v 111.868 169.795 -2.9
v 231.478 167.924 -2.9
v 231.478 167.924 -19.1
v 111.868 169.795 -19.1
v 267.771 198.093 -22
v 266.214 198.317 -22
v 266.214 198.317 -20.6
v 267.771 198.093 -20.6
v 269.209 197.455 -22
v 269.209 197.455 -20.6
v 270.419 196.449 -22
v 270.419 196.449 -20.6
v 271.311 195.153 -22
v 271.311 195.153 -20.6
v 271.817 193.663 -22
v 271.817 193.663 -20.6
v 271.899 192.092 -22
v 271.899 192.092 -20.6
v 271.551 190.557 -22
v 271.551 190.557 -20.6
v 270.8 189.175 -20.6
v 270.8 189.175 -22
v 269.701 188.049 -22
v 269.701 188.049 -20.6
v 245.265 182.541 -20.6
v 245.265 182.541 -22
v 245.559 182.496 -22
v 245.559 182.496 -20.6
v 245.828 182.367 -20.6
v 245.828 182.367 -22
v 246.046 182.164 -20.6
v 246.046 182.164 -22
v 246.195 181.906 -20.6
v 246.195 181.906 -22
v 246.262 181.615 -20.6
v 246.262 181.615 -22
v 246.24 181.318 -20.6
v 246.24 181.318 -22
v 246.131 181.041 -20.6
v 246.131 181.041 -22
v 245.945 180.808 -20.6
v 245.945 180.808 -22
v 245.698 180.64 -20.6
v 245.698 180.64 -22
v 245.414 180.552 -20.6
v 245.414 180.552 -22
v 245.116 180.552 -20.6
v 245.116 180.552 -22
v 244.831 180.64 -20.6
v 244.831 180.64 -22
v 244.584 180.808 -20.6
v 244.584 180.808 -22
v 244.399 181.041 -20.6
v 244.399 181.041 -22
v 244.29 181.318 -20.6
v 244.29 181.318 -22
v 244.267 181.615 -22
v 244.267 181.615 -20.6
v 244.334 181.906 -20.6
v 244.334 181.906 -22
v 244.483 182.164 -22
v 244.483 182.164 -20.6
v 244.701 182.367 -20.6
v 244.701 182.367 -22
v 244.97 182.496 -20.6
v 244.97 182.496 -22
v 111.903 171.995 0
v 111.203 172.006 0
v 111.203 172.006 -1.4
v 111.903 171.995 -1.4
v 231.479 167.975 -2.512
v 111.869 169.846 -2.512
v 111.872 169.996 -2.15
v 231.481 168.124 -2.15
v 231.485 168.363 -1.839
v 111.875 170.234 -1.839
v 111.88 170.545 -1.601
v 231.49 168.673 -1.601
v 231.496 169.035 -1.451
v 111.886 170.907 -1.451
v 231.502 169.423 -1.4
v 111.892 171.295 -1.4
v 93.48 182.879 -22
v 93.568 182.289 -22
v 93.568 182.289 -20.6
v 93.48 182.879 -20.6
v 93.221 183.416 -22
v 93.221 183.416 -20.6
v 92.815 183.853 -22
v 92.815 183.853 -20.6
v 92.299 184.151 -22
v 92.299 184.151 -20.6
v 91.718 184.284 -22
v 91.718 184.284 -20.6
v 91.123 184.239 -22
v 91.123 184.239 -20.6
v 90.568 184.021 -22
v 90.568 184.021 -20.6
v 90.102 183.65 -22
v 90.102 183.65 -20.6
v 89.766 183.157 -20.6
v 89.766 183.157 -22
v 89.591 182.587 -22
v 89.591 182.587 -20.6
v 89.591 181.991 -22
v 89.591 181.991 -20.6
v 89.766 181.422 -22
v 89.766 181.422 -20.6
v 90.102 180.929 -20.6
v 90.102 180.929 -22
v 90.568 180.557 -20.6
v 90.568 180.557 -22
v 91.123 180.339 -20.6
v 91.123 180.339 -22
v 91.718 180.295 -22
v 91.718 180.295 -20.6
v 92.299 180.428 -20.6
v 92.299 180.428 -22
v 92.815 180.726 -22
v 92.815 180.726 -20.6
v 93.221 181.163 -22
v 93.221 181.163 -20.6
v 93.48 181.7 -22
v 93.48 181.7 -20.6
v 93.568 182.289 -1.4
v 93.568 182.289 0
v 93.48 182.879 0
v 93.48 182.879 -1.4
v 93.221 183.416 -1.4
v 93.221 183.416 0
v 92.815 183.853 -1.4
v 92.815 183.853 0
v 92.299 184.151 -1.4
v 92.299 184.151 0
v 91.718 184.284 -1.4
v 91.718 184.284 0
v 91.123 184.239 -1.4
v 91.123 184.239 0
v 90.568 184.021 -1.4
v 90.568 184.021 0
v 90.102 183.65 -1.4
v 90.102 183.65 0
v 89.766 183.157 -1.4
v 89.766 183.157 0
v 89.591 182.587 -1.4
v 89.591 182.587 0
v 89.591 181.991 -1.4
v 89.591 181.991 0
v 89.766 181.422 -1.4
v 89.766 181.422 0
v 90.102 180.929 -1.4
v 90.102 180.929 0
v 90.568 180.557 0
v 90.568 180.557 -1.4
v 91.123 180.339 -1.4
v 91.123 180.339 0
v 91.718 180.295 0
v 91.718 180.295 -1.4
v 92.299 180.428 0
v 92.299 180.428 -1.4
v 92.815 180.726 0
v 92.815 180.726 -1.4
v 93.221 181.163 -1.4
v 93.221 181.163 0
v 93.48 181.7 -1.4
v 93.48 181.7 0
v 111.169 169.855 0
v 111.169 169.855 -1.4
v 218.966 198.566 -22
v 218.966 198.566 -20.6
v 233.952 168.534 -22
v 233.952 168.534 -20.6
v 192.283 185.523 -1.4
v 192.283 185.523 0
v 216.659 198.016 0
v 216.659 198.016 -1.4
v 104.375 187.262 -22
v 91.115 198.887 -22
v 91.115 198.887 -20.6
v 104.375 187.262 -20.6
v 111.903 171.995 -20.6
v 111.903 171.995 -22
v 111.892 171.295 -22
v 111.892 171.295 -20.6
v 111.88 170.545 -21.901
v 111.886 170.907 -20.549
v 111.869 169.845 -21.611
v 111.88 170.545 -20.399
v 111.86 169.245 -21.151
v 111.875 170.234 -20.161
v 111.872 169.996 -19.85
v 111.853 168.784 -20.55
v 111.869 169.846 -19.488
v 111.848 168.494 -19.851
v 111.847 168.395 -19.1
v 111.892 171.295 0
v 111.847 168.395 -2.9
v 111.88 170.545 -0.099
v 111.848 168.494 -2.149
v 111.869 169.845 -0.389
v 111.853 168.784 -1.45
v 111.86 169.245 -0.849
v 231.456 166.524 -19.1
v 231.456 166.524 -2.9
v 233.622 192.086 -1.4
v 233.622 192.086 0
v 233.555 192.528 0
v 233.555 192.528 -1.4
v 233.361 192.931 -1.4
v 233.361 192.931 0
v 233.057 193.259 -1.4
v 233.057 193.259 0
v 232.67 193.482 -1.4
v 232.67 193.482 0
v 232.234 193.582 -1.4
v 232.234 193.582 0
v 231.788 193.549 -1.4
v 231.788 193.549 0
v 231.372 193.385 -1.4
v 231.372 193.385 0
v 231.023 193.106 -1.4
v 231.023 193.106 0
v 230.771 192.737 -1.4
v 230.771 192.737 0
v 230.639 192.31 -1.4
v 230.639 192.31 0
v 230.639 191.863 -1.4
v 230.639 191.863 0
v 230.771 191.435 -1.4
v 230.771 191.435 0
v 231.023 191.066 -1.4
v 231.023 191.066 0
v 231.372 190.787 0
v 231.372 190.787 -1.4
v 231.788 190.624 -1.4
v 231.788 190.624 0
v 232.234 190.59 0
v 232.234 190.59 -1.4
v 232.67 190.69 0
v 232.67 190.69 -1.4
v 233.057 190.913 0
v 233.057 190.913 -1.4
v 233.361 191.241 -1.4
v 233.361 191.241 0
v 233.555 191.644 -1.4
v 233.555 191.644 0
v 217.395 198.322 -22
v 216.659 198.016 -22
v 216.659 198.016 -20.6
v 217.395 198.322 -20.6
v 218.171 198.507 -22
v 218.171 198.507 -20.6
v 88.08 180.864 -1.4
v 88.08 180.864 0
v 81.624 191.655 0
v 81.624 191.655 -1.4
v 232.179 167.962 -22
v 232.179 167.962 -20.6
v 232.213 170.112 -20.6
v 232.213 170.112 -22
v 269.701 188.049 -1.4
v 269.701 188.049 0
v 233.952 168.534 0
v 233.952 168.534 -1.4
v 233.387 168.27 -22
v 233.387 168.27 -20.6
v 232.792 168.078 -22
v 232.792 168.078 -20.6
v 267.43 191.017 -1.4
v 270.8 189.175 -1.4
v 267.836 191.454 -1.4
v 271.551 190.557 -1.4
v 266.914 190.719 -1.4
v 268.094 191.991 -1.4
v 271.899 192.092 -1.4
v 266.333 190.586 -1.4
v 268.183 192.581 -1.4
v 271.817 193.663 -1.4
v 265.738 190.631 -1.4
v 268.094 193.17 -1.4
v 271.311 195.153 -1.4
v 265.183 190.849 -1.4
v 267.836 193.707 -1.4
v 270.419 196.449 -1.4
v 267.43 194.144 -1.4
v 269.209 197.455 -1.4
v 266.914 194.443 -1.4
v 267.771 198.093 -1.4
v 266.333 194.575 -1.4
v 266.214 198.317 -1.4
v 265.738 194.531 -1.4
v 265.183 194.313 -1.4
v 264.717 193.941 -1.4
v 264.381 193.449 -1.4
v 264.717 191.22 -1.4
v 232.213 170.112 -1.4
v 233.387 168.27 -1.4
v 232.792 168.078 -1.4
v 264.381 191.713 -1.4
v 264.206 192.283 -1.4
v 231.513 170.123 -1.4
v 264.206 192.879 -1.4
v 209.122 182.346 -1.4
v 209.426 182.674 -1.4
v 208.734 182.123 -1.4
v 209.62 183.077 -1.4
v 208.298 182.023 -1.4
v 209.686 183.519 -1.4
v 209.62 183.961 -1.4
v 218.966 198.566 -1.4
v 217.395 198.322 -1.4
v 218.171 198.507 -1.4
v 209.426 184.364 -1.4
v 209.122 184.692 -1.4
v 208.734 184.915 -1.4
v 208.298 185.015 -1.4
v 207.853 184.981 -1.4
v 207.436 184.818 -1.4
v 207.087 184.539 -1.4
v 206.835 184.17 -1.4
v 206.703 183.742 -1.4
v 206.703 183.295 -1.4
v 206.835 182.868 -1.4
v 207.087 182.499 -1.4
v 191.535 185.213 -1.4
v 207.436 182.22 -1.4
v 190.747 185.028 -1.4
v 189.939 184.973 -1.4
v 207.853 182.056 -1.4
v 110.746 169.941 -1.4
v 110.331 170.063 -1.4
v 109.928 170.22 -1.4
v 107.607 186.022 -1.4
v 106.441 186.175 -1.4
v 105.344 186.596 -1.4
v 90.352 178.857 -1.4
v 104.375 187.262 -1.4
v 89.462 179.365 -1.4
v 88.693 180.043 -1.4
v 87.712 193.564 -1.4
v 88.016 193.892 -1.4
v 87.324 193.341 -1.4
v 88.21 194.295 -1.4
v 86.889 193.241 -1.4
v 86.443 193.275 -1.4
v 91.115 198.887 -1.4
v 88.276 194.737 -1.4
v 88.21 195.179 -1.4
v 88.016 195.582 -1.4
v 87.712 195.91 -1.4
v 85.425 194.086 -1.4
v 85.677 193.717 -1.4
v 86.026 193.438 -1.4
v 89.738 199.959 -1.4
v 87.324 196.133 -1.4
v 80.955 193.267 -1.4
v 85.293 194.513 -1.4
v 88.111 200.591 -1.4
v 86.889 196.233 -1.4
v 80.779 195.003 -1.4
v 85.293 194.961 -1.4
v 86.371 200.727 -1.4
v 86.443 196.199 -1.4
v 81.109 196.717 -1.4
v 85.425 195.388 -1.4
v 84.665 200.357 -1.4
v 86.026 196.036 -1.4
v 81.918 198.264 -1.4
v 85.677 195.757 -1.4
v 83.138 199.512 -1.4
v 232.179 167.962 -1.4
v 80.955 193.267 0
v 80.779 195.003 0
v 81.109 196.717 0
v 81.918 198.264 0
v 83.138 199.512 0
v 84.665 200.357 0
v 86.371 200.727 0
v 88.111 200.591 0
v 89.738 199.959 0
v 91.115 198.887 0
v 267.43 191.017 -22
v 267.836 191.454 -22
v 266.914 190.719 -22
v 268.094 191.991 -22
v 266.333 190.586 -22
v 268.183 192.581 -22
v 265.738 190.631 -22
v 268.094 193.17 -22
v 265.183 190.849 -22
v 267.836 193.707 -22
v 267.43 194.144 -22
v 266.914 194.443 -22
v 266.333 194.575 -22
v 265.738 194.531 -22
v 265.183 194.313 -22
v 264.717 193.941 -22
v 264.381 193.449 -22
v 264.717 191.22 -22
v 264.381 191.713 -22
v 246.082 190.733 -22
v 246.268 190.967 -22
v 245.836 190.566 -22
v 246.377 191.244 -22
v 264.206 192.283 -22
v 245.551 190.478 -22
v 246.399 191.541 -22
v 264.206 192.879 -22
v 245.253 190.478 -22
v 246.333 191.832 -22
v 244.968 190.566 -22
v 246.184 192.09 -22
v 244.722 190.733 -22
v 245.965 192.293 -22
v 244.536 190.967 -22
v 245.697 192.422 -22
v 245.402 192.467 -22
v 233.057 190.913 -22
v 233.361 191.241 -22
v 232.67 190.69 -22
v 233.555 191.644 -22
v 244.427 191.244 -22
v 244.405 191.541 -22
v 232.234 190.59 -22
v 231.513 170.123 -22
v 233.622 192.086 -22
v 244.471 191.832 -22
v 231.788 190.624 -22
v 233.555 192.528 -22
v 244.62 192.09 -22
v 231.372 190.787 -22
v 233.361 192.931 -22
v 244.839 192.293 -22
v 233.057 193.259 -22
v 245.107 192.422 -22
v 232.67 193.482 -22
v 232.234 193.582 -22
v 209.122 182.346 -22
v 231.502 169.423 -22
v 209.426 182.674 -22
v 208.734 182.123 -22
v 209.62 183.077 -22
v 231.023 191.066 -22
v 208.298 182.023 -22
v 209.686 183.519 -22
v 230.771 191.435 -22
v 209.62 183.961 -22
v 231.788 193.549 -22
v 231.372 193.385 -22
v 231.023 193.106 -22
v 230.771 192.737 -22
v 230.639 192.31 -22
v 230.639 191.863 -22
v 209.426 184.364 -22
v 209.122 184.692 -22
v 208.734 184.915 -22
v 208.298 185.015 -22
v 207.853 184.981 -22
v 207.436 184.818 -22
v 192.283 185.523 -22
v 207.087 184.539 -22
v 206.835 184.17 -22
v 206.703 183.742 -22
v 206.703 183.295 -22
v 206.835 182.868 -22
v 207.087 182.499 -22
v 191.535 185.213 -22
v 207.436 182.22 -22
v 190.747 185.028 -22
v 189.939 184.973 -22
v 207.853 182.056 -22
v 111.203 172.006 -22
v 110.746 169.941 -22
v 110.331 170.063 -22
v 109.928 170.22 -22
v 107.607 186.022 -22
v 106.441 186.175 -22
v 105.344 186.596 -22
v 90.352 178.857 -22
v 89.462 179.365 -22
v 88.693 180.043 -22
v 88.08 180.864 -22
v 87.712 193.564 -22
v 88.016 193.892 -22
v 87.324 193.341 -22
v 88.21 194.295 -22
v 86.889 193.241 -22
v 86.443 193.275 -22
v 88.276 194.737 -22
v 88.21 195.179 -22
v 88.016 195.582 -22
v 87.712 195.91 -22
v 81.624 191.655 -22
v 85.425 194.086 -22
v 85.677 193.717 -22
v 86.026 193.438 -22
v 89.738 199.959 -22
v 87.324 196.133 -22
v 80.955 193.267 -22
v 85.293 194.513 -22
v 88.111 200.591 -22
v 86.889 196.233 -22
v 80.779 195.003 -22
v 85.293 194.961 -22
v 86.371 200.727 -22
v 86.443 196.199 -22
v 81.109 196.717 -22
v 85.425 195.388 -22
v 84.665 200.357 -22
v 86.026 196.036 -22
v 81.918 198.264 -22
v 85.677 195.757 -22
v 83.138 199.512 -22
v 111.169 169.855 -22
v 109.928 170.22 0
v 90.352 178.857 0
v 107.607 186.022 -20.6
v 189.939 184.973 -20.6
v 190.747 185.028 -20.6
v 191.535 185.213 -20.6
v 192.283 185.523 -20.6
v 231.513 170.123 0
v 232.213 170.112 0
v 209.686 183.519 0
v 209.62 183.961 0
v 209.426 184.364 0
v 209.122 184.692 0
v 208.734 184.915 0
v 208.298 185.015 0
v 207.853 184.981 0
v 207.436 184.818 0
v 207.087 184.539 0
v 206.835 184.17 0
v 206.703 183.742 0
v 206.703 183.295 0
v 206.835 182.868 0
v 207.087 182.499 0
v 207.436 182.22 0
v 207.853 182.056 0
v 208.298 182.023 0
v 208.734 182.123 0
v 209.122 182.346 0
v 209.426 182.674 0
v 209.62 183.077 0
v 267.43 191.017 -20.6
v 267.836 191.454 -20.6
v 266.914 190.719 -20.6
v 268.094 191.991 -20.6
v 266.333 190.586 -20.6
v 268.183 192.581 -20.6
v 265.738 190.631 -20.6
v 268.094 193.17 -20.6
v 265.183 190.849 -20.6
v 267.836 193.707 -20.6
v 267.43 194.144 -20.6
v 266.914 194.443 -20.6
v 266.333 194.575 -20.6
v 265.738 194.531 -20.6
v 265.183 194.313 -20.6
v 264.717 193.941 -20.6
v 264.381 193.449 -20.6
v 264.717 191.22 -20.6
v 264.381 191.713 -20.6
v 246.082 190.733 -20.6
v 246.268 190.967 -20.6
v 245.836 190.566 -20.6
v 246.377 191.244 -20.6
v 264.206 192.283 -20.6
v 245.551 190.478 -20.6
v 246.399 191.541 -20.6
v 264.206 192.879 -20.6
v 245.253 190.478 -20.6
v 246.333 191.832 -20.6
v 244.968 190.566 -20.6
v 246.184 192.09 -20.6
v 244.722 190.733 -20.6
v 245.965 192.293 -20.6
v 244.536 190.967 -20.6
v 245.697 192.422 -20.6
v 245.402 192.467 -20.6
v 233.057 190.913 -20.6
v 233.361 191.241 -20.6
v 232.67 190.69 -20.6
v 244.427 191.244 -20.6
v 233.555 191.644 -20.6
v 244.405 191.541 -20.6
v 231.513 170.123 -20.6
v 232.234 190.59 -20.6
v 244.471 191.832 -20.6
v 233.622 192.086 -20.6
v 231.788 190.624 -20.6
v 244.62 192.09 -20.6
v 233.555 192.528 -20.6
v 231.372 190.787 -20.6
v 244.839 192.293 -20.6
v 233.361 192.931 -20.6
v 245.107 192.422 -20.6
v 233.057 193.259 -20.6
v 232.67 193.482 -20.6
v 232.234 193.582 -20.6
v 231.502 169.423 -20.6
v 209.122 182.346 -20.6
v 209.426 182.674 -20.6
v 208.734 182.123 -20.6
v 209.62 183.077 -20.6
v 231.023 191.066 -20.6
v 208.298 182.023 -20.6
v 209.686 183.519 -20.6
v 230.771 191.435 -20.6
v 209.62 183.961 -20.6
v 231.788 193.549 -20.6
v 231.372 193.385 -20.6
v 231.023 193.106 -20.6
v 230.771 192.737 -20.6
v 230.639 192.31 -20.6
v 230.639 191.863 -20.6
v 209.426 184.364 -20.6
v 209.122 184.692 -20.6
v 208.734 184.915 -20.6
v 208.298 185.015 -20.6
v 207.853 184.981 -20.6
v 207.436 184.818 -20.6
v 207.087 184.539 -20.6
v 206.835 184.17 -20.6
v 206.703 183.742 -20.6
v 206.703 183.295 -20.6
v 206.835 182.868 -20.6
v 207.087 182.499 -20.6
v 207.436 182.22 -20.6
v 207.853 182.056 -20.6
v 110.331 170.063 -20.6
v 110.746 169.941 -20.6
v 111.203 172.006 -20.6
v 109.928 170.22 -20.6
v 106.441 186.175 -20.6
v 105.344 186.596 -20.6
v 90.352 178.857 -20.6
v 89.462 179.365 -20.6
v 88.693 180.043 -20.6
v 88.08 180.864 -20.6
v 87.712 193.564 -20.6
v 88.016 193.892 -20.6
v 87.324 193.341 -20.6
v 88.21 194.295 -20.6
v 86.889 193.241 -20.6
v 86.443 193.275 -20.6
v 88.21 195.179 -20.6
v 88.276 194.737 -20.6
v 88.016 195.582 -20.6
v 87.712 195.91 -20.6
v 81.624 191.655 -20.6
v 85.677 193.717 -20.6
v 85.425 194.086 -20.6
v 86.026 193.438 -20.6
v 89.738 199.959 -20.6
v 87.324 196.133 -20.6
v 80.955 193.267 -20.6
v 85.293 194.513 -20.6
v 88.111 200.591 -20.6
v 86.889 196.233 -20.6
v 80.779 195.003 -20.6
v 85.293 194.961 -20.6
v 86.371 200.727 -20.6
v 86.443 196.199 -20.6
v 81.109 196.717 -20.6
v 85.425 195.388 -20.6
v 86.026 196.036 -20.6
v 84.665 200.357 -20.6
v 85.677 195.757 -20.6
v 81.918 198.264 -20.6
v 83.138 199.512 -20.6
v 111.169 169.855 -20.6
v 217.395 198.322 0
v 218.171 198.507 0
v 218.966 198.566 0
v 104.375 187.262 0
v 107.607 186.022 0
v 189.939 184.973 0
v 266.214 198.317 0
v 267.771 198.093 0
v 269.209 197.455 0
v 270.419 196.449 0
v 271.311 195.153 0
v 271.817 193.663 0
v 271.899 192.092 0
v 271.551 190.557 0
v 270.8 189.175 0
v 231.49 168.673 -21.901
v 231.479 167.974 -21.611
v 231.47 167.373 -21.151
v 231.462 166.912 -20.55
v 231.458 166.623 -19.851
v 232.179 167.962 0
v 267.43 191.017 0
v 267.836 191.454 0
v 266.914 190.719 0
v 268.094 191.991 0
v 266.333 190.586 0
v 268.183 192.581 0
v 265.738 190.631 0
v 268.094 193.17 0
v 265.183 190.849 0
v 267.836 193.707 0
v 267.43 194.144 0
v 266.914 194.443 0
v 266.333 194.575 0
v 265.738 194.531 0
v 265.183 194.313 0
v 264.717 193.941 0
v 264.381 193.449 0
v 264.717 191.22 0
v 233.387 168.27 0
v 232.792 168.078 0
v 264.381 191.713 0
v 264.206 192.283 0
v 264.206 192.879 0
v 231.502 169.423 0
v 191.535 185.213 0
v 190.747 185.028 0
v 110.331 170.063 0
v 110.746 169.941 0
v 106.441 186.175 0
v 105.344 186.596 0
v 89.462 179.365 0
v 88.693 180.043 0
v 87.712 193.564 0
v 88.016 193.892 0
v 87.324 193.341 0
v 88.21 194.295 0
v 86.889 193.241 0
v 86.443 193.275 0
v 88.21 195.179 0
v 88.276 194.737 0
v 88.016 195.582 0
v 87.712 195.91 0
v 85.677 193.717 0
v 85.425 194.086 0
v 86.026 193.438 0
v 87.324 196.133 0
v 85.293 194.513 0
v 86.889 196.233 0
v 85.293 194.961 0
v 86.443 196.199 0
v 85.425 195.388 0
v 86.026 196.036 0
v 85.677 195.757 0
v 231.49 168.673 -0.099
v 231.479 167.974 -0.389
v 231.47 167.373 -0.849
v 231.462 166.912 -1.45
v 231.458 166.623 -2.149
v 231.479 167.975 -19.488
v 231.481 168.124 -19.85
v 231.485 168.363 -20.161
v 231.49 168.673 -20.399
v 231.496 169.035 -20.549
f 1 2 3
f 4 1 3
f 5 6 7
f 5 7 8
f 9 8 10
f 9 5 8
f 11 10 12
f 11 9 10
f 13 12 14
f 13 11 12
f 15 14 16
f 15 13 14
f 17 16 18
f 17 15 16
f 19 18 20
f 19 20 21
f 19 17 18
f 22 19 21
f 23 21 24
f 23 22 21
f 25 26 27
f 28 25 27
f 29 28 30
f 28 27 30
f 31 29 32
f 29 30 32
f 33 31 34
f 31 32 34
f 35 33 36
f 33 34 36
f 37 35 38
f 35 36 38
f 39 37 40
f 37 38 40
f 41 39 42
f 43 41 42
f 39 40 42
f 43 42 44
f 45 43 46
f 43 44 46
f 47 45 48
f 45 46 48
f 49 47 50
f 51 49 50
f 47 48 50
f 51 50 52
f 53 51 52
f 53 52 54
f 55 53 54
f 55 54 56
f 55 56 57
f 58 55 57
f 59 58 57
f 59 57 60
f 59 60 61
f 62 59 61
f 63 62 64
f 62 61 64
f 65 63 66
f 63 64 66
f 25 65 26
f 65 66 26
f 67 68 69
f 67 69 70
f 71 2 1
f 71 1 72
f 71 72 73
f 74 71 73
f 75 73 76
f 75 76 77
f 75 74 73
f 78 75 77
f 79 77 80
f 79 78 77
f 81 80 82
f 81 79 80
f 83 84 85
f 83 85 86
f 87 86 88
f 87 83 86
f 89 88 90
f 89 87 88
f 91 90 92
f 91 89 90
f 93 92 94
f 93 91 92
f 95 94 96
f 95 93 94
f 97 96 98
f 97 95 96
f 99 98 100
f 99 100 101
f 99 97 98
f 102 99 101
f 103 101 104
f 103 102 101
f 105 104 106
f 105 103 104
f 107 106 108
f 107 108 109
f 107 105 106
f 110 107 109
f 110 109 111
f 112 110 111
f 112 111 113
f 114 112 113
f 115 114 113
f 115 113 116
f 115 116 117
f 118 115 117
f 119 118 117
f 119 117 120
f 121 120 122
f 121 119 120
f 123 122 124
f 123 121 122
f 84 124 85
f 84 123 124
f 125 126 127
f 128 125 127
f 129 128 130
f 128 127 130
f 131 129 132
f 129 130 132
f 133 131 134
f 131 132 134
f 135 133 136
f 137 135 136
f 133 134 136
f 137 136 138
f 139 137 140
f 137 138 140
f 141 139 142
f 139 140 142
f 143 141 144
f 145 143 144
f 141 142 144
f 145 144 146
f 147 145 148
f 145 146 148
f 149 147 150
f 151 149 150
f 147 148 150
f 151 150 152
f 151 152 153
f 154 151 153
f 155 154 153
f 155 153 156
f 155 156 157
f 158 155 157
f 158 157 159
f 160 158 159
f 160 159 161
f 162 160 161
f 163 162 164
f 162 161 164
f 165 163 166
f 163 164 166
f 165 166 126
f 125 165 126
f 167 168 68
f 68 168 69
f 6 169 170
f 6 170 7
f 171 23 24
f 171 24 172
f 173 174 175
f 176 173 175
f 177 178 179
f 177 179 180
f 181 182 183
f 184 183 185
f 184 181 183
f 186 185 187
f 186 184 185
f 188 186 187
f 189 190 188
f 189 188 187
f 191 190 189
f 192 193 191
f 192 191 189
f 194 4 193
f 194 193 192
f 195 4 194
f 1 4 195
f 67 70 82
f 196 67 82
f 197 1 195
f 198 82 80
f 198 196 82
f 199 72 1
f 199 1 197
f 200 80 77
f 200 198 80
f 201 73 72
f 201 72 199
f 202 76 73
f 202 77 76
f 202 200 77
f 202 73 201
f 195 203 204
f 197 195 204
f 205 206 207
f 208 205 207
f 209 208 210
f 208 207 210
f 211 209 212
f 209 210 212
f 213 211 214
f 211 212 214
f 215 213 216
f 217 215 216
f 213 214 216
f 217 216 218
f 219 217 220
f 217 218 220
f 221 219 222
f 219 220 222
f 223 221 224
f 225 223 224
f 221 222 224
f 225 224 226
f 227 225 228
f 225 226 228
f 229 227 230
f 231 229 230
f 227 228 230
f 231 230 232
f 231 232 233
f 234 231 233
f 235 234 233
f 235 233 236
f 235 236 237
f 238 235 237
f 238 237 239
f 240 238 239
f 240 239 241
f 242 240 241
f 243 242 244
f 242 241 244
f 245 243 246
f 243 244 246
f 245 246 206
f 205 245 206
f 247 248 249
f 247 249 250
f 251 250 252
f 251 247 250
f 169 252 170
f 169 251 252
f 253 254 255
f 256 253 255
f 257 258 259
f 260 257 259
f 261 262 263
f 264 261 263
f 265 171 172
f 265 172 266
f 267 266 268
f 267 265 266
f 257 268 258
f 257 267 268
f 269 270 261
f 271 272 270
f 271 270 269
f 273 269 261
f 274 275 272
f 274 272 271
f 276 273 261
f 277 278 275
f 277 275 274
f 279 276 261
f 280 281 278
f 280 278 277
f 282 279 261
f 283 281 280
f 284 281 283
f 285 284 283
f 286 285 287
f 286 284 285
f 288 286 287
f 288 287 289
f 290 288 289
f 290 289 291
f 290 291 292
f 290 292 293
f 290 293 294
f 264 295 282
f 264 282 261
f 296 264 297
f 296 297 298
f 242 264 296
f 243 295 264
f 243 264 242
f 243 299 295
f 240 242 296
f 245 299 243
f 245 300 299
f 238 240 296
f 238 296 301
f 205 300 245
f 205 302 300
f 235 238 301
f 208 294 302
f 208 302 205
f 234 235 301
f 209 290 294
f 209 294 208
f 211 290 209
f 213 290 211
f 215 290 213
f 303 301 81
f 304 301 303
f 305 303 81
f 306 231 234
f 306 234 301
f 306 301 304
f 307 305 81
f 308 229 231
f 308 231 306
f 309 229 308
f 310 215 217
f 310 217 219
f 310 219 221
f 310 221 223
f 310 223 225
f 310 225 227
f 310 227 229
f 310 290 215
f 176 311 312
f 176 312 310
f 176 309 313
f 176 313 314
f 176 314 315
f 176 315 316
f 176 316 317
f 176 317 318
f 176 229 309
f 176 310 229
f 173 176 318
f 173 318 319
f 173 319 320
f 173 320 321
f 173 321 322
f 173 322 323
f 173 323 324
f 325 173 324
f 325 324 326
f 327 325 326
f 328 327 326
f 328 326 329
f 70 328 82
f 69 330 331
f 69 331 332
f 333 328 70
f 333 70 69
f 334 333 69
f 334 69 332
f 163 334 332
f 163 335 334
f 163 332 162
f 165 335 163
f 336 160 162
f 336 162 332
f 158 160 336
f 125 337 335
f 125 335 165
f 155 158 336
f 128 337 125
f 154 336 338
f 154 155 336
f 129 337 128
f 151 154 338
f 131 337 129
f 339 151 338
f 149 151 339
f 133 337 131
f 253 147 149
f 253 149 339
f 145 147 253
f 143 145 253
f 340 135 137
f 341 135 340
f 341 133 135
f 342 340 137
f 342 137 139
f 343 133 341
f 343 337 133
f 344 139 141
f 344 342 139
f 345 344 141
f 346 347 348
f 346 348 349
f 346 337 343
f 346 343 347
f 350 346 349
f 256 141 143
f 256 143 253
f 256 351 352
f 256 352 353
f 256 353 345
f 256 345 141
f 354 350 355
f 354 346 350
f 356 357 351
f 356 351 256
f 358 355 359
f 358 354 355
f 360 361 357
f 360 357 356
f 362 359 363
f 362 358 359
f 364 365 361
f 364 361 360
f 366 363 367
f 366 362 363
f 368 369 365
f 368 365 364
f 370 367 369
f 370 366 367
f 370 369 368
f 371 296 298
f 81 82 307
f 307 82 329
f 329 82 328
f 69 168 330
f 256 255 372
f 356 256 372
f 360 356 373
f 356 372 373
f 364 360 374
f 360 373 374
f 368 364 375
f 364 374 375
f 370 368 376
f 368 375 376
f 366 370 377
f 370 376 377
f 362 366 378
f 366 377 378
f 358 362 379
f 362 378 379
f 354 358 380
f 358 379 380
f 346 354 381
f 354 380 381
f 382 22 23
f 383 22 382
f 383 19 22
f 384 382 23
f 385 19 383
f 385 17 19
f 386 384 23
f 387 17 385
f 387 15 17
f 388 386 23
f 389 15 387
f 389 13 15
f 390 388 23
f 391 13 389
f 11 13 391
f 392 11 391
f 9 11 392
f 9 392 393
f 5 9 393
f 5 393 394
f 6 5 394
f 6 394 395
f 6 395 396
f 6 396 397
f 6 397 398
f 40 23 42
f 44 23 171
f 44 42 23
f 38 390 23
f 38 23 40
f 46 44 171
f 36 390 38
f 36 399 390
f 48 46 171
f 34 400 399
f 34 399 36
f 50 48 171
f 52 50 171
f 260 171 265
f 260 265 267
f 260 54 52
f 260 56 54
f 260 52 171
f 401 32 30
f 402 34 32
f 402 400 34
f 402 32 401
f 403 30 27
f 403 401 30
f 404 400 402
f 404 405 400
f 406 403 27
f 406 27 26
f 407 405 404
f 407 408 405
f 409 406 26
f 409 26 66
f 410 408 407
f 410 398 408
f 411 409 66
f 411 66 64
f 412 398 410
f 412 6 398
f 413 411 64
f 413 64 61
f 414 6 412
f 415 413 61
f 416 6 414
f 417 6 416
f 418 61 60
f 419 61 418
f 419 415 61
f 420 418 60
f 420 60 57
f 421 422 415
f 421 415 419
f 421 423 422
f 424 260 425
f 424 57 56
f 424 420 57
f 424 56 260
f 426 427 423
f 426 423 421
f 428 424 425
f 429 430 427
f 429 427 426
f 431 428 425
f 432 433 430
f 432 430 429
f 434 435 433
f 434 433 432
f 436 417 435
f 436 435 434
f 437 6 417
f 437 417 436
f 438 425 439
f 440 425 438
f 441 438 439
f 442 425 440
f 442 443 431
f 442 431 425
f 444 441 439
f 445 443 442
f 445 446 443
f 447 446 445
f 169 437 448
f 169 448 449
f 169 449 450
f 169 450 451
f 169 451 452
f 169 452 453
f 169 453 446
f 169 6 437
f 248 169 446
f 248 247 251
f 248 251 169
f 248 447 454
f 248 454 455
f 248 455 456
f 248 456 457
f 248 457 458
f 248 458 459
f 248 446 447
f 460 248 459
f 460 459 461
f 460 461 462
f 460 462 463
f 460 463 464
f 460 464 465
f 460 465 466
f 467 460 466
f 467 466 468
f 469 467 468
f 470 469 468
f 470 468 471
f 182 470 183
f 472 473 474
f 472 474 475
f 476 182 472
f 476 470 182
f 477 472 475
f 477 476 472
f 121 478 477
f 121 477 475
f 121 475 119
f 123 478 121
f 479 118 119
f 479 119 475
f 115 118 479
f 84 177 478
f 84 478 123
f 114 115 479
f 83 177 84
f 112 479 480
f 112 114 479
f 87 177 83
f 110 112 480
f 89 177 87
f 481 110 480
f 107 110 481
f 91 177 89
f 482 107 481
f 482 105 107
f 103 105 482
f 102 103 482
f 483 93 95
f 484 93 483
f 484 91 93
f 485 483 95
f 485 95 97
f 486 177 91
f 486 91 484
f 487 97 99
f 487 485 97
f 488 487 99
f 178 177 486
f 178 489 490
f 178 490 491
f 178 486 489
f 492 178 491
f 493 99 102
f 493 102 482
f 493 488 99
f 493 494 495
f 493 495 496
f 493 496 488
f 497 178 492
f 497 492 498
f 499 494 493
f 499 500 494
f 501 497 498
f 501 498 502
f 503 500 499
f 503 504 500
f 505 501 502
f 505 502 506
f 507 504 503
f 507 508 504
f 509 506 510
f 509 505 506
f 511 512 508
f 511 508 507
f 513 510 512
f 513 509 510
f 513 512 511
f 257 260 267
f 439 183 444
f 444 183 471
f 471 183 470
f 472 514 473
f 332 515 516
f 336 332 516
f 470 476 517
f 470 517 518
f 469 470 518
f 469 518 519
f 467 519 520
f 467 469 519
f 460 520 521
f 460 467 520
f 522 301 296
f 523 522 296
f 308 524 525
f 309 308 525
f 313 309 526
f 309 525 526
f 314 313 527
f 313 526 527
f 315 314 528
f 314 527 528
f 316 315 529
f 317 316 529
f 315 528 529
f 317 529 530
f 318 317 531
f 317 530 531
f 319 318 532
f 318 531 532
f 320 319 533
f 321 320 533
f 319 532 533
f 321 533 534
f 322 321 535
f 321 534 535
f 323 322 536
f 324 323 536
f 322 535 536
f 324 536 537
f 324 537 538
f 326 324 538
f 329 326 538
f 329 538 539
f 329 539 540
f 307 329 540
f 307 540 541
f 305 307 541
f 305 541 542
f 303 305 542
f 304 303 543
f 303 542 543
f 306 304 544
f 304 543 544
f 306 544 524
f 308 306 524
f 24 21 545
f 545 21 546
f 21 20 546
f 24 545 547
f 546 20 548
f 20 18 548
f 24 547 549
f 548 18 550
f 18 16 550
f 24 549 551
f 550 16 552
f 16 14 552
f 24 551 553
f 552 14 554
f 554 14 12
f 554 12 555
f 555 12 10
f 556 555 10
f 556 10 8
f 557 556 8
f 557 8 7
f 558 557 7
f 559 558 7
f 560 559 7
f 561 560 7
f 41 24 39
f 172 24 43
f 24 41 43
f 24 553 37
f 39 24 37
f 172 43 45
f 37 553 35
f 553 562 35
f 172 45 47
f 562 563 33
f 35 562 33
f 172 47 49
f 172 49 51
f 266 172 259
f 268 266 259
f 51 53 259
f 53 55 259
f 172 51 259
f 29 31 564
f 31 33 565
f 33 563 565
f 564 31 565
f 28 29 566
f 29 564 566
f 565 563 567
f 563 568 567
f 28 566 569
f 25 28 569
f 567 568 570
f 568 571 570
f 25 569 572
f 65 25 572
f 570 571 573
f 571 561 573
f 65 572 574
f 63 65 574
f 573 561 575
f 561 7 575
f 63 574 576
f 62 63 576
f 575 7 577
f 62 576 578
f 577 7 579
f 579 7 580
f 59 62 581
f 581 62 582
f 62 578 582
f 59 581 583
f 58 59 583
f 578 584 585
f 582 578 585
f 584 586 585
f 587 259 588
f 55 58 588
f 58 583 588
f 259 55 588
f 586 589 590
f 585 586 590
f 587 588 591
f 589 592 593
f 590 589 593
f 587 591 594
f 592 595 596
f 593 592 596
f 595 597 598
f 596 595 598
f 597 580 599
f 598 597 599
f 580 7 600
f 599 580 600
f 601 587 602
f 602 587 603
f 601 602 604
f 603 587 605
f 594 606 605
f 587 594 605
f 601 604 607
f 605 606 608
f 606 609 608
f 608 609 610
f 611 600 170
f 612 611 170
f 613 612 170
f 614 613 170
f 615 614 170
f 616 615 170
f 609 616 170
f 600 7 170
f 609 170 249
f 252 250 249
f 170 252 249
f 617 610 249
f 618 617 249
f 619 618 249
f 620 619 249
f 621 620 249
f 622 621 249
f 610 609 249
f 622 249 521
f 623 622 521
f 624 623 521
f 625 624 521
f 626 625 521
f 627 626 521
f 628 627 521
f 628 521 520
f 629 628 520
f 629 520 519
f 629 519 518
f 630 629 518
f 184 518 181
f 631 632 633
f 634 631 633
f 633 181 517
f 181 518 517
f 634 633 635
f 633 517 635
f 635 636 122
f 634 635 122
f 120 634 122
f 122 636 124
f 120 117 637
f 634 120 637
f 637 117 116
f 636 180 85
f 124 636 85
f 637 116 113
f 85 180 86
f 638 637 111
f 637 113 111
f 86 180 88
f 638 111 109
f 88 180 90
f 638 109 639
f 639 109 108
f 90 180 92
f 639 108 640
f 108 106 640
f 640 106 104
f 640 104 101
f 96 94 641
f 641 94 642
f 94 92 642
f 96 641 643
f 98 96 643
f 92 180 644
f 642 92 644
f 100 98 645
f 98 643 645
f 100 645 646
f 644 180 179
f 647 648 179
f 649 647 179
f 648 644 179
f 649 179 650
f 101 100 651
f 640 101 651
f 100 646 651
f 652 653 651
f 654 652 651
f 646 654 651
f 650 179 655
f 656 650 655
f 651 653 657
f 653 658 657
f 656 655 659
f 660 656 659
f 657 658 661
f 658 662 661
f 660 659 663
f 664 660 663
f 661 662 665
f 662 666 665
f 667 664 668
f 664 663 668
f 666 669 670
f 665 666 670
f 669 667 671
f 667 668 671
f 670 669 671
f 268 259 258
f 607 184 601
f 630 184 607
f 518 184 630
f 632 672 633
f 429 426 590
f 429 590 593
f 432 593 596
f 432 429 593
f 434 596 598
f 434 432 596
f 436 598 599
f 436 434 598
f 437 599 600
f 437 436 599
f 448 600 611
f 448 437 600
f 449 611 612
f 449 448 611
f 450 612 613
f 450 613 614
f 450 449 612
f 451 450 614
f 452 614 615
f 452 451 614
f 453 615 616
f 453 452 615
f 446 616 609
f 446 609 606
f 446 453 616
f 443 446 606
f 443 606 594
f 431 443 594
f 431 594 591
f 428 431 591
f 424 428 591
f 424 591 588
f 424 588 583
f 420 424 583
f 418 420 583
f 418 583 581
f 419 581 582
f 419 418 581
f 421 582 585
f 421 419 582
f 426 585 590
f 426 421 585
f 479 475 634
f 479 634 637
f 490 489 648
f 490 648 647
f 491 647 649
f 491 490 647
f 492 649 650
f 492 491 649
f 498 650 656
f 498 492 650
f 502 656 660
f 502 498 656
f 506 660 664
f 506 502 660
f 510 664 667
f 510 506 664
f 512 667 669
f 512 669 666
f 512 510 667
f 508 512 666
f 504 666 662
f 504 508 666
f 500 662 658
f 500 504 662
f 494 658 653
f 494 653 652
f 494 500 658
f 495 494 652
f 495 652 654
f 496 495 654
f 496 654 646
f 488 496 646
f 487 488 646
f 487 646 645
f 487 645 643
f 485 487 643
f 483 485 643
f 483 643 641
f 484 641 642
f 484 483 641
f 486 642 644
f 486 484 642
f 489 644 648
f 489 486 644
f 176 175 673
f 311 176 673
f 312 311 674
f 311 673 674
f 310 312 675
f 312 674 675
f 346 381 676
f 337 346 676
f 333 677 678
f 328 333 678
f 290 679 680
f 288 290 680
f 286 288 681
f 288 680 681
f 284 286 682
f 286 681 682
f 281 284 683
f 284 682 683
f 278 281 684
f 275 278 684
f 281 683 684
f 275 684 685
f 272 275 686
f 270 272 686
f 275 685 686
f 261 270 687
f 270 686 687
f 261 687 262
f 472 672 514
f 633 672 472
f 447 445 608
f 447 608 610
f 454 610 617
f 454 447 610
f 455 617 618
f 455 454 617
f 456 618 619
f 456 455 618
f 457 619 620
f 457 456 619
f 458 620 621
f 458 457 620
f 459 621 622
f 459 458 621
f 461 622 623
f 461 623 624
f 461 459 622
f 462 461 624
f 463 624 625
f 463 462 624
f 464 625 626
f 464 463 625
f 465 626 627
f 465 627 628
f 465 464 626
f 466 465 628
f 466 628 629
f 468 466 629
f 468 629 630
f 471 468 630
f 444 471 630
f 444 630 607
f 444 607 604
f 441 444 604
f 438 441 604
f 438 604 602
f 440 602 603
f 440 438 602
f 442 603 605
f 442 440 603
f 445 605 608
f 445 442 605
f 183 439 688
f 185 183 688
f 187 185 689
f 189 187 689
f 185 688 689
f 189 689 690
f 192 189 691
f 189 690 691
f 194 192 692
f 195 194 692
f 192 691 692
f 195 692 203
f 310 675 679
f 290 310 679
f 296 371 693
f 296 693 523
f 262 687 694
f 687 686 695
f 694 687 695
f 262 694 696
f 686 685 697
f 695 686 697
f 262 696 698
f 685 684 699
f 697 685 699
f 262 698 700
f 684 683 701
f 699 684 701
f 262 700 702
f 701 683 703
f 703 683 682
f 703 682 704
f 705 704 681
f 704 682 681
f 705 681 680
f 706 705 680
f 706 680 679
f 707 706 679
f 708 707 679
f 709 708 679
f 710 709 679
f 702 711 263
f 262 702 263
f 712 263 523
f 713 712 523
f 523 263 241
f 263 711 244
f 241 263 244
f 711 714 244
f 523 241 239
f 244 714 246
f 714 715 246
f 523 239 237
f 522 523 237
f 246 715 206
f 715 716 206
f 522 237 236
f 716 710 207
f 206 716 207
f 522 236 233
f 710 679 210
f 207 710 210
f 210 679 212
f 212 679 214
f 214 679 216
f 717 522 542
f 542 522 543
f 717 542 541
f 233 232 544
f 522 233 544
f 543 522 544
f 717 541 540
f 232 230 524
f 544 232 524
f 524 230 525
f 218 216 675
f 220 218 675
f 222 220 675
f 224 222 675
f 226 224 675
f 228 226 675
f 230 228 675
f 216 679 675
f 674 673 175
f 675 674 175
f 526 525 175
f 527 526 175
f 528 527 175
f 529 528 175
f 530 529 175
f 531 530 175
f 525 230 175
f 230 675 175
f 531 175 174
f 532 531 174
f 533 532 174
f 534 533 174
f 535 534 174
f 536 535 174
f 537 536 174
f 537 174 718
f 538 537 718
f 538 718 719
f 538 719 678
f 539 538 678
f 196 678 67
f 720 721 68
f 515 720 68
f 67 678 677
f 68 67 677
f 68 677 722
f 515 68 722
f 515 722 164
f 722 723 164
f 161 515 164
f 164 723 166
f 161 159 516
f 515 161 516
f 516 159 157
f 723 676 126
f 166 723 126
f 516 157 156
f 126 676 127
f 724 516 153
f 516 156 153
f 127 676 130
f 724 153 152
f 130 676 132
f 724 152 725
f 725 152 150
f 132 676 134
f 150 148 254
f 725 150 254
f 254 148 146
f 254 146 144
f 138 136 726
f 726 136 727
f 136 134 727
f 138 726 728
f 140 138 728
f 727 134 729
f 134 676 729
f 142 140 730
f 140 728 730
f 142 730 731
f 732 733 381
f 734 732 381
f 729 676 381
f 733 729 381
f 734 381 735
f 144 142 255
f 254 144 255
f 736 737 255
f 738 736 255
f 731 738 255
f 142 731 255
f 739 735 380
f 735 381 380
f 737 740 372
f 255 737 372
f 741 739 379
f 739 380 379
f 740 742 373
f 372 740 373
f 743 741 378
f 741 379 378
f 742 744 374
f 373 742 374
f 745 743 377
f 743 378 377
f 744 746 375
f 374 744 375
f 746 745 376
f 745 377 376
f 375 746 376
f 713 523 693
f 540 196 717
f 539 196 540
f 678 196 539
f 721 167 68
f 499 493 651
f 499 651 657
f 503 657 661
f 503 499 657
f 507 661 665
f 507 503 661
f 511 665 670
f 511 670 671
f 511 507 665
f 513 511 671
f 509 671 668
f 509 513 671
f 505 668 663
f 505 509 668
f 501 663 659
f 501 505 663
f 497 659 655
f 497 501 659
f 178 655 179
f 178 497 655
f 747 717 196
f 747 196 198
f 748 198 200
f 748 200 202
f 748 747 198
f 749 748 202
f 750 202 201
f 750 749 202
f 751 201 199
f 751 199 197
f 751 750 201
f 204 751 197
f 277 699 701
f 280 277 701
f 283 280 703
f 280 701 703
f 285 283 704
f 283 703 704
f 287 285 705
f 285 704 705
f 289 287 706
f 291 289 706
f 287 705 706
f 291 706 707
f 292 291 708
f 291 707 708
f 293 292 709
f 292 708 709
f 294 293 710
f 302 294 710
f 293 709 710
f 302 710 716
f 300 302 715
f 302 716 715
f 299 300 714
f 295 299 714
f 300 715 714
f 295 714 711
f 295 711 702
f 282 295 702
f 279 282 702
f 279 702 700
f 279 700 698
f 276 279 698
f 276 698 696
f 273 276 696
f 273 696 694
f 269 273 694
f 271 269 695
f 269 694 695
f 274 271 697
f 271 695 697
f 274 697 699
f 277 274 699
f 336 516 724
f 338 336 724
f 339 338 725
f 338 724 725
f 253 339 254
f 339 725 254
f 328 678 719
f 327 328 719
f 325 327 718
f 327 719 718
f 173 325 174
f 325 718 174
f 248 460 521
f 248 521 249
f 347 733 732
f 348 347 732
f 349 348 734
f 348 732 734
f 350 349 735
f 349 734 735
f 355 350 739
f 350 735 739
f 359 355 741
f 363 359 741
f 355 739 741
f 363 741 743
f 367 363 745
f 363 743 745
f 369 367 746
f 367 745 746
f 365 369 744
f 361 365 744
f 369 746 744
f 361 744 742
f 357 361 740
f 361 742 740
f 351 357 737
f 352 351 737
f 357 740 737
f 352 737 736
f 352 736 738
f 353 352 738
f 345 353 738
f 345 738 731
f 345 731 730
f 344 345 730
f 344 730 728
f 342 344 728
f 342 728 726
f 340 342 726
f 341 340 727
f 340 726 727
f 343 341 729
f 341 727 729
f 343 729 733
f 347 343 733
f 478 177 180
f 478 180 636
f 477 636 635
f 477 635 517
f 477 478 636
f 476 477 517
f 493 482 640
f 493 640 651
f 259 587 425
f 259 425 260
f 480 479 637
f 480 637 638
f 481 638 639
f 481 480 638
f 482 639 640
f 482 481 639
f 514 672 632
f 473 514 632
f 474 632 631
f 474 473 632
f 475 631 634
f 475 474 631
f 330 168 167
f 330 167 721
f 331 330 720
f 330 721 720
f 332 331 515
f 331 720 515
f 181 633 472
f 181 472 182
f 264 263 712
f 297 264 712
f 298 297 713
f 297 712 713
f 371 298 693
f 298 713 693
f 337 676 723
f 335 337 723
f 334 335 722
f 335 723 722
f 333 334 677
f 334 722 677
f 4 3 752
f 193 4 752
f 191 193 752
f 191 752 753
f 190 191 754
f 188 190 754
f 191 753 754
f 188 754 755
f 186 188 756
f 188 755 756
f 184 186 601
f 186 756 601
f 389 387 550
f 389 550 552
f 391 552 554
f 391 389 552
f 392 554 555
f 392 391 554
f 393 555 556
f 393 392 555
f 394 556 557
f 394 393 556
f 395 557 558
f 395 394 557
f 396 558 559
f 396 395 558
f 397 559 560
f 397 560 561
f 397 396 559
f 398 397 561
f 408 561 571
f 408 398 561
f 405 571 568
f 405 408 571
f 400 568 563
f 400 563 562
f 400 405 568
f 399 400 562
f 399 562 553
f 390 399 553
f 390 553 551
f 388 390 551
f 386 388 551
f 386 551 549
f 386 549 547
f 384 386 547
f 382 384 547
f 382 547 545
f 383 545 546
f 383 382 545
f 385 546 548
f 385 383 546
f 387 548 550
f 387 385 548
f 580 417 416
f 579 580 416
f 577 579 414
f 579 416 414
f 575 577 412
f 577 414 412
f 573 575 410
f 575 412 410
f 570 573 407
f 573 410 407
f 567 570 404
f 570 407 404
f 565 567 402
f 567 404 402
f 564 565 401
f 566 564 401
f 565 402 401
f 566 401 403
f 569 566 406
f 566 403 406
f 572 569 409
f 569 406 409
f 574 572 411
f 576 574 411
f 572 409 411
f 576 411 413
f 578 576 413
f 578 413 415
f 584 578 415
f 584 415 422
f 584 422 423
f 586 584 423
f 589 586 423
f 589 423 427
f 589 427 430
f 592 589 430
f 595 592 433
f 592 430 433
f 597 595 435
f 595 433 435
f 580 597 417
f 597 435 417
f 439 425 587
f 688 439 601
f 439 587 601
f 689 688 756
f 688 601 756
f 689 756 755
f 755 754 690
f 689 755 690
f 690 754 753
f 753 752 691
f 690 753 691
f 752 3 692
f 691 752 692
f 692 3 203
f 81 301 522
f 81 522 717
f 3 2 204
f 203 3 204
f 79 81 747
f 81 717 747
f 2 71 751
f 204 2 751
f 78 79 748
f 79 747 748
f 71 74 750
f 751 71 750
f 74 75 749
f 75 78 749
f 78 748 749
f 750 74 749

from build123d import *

# Parameters (mm, degrees)
SKETCH2_R                     = 1.5
SKETCH2_R_2                   = 2
BASE_FLANGE1_DEPTH            = 1.4
EDGE_FLANGE1_STRIP_W          = 8.6
EDGE_FLANGE1_STRIP_H          = 1.4
EDGE_FLANGE1_STRIP_CUT_DEPTH  = 119.624404155
EDGE_FLANGE1_RELIEF_W         = 9.3
EDGE_FLANGE1_RELIEF_H         = 0.7
EDGE_FLANGE1_RELIEF_CUT_DEPTH = 1.4
EDGE_FLANGE1_DEPTH            = 119.624404155
SKETCH17_R                    = 1
CUT_EXTRUDE1_DEPTH            = 1.4


# Sheet-metal steps are written as plain solids
with BuildPart() as part:
    # Sketch2 → Base-Flange1 (new body)
    with BuildSketch(Plane.XY):
        with BuildLine():
            Line((231.478213009, 167.923533188), (111.868451864, 169.7951924))
            ThreePointArc((111.868451864, 169.7951924), (110.877145651, 169.910310621), (109.928447229, 170.220006467))
            Line((109.928447229, 170.220006467), (90.352175795, 178.856771959))
            ThreePointArc((90.352175795, 178.856771959), (89.060059005, 179.68413768), (88.079658187, 180.864355486))
            Line((88.079658187, 180.864355486), (81.624256856, 191.654630499))
            ThreePointArc((81.624256856, 191.654630499), (83.137635743, 199.512444421), (91.115351923, 198.886665029))
            Line((91.115351923, 198.886665029), (104.374715918, 187.262186129))
            ThreePointArc((104.374715918, 187.262186129), (105.880179055, 186.353553036), (107.60711557, 186.022307468))
            Line((107.60711557, 186.022307468), (189.939055045, 184.972638911))
            ThreePointArc((189.939055045, 184.972638911), (191.144825453, 185.104402623), (192.283387705, 185.522636952))
            Line((192.283387705, 185.522636952), (216.658747604, 198.015961736))
            ThreePointArc((216.658747604, 198.015961736), (217.779120548, 198.429892832), (218.965699032, 198.5662966))
            Line((218.965699032, 198.5662966), (266.21359493, 198.317204861))
            ThreePointArc((266.21359493, 198.317204861), (271.61517707, 194.425420779), (269.70061588, 188.049095159))
            Line((269.70061588, 188.049095159), (233.952189626, 168.534253774))
            ThreePointArc((233.952189626, 168.534253774), (232.754760905, 168.068640994), (231.478213009, 167.923533188))
        make_face()
        with Locations((86.776445718, 194.736984451)):
            Circle(SKETCH2_R, mode=Mode.SUBTRACT)
        with Locations((91.568382251, 182.289296649)):
            Circle(SKETCH2_R_2, mode=Mode.SUBTRACT)
        with Locations((208.186382216, 183.518819995)):
            Circle(SKETCH2_R, mode=Mode.SUBTRACT)
        with Locations((232.122136742, 192.086173294)):
            Circle(SKETCH2_R, mode=Mode.SUBTRACT)
        with Locations((266.183352442, 192.580788532)):
            Circle(SKETCH2_R_2, mode=Mode.SUBTRACT)
    extrude(amount=-BASE_FLANGE1_DEPTH)

    # Edge-Flange1 strip (across the edge) → Edge-Flange1 strip cut (cut)
    with BuildSketch(Plane(origin=(231.478213009, 167.923533188, -1.4), x_dir=(0.015646131950223352, 0.9998775917856126, -3.4914813388431334e-15), z_dir=(-0.9998775917856126, 0.015646131950223352, 0))):
        with Locations((-2.8, -0.7)):
            Rectangle(EDGE_FLANGE1_STRIP_W, EDGE_FLANGE1_STRIP_H)
    extrude(amount=EDGE_FLANGE1_STRIP_CUT_DEPTH, mode=Mode.SUBTRACT)

    # Edge-Flange1 relief (on the sheet) → Edge-Flange1 relief cut (cut)
    with BuildSketch(Plane(origin=(231.501682207, 169.423349576, -1.4), x_dir=(0.015646131950223352, 0.9998775917856126, -6.982962677686267e-15), z_dir=(0, 0, -1))):
        with Locations((-3.95, 0.35)):
            Rectangle(EDGE_FLANGE1_RELIEF_W, EDGE_FLANGE1_RELIEF_H)
        with Locations((-3.95, -119.974404155)):
            Rectangle(EDGE_FLANGE1_RELIEF_W, EDGE_FLANGE1_RELIEF_H)
    extrude(amount=-EDGE_FLANGE1_RELIEF_CUT_DEPTH, mode=Mode.SUBTRACT)

    # Edge-Flange1 section (across the edge) → Edge-Flange1 (add)
    with BuildSketch(Plane(origin=(231.478213009, 167.923533188, -1.4), x_dir=(0.015646131950223352, 0.9998775917856126, -3.4914813388431334e-15), z_dir=(-0.9998775917856126, 0.015646131950223352, 0))):
        with BuildLine():
            Line((-1.4, 1.5), (-1.4, 9.6))
            Line((-1.4, 9.6), (0, 9.6))
            Line((0, 9.6), (0, 1.5))
            ThreePointArc((0, 1.5), (0.439339828, 0.439339828), (1.5, 0))
            Line((1.5, 0), (1.5, -1.4))
            ThreePointArc((1.5, -1.4), (-0.550609665, -0.550609665), (-1.4, 1.5))
        make_face()
    extrude(amount=EDGE_FLANGE1_DEPTH)

    # Mirror1: part across plane


with BuildPart() as part_1:
    add(part.part)
    add(part.part.mirror(Plane(origin=(231.456308425, 166.52370456, -11), x_dir=(1, 0, 0), z_dir=(0, 0, 1))))

    # Sketch17 → Cut-Extrude1 (cut)
    with BuildSketch(Plane(origin=(0, 0, -22), x_dir=(-1, 0, 0), z_dir=(0, 0, -1))):
        with Locations(Location((-245.401847545, 191.466522217, 0), (0, 0, 90))):
            Circle(SKETCH17_R)
        with Locations(Location((-245.26459516, 181.540767155, 0), (0, 0, 90))):
            Circle(SKETCH17_R)
    extrude(amount=-CUT_EXTRUDE1_DEPTH, mode=Mode.SUBTRACT)


solid = part_1.part
